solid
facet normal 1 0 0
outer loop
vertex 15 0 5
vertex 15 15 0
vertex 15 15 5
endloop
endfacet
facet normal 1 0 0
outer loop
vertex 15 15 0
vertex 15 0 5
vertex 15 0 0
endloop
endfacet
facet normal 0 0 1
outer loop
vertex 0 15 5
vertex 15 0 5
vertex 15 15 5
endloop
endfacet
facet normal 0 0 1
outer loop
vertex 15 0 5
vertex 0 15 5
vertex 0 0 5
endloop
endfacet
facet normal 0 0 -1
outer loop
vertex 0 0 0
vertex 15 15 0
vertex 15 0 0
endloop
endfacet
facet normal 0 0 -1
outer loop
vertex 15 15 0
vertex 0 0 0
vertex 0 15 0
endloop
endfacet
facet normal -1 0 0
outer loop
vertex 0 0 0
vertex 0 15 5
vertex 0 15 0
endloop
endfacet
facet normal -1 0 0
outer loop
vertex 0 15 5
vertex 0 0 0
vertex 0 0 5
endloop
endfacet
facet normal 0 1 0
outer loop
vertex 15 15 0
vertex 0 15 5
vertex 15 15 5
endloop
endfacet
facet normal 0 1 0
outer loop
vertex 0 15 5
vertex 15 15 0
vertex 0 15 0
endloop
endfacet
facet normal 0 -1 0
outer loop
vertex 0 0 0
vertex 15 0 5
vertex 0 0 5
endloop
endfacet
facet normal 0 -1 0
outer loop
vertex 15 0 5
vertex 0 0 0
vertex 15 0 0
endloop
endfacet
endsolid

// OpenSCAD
difference(){
	union(){ 
        translate([0,0,0]){
           cube([15,15,5], center=false);
        }                
	}
	union() {

	}
}
